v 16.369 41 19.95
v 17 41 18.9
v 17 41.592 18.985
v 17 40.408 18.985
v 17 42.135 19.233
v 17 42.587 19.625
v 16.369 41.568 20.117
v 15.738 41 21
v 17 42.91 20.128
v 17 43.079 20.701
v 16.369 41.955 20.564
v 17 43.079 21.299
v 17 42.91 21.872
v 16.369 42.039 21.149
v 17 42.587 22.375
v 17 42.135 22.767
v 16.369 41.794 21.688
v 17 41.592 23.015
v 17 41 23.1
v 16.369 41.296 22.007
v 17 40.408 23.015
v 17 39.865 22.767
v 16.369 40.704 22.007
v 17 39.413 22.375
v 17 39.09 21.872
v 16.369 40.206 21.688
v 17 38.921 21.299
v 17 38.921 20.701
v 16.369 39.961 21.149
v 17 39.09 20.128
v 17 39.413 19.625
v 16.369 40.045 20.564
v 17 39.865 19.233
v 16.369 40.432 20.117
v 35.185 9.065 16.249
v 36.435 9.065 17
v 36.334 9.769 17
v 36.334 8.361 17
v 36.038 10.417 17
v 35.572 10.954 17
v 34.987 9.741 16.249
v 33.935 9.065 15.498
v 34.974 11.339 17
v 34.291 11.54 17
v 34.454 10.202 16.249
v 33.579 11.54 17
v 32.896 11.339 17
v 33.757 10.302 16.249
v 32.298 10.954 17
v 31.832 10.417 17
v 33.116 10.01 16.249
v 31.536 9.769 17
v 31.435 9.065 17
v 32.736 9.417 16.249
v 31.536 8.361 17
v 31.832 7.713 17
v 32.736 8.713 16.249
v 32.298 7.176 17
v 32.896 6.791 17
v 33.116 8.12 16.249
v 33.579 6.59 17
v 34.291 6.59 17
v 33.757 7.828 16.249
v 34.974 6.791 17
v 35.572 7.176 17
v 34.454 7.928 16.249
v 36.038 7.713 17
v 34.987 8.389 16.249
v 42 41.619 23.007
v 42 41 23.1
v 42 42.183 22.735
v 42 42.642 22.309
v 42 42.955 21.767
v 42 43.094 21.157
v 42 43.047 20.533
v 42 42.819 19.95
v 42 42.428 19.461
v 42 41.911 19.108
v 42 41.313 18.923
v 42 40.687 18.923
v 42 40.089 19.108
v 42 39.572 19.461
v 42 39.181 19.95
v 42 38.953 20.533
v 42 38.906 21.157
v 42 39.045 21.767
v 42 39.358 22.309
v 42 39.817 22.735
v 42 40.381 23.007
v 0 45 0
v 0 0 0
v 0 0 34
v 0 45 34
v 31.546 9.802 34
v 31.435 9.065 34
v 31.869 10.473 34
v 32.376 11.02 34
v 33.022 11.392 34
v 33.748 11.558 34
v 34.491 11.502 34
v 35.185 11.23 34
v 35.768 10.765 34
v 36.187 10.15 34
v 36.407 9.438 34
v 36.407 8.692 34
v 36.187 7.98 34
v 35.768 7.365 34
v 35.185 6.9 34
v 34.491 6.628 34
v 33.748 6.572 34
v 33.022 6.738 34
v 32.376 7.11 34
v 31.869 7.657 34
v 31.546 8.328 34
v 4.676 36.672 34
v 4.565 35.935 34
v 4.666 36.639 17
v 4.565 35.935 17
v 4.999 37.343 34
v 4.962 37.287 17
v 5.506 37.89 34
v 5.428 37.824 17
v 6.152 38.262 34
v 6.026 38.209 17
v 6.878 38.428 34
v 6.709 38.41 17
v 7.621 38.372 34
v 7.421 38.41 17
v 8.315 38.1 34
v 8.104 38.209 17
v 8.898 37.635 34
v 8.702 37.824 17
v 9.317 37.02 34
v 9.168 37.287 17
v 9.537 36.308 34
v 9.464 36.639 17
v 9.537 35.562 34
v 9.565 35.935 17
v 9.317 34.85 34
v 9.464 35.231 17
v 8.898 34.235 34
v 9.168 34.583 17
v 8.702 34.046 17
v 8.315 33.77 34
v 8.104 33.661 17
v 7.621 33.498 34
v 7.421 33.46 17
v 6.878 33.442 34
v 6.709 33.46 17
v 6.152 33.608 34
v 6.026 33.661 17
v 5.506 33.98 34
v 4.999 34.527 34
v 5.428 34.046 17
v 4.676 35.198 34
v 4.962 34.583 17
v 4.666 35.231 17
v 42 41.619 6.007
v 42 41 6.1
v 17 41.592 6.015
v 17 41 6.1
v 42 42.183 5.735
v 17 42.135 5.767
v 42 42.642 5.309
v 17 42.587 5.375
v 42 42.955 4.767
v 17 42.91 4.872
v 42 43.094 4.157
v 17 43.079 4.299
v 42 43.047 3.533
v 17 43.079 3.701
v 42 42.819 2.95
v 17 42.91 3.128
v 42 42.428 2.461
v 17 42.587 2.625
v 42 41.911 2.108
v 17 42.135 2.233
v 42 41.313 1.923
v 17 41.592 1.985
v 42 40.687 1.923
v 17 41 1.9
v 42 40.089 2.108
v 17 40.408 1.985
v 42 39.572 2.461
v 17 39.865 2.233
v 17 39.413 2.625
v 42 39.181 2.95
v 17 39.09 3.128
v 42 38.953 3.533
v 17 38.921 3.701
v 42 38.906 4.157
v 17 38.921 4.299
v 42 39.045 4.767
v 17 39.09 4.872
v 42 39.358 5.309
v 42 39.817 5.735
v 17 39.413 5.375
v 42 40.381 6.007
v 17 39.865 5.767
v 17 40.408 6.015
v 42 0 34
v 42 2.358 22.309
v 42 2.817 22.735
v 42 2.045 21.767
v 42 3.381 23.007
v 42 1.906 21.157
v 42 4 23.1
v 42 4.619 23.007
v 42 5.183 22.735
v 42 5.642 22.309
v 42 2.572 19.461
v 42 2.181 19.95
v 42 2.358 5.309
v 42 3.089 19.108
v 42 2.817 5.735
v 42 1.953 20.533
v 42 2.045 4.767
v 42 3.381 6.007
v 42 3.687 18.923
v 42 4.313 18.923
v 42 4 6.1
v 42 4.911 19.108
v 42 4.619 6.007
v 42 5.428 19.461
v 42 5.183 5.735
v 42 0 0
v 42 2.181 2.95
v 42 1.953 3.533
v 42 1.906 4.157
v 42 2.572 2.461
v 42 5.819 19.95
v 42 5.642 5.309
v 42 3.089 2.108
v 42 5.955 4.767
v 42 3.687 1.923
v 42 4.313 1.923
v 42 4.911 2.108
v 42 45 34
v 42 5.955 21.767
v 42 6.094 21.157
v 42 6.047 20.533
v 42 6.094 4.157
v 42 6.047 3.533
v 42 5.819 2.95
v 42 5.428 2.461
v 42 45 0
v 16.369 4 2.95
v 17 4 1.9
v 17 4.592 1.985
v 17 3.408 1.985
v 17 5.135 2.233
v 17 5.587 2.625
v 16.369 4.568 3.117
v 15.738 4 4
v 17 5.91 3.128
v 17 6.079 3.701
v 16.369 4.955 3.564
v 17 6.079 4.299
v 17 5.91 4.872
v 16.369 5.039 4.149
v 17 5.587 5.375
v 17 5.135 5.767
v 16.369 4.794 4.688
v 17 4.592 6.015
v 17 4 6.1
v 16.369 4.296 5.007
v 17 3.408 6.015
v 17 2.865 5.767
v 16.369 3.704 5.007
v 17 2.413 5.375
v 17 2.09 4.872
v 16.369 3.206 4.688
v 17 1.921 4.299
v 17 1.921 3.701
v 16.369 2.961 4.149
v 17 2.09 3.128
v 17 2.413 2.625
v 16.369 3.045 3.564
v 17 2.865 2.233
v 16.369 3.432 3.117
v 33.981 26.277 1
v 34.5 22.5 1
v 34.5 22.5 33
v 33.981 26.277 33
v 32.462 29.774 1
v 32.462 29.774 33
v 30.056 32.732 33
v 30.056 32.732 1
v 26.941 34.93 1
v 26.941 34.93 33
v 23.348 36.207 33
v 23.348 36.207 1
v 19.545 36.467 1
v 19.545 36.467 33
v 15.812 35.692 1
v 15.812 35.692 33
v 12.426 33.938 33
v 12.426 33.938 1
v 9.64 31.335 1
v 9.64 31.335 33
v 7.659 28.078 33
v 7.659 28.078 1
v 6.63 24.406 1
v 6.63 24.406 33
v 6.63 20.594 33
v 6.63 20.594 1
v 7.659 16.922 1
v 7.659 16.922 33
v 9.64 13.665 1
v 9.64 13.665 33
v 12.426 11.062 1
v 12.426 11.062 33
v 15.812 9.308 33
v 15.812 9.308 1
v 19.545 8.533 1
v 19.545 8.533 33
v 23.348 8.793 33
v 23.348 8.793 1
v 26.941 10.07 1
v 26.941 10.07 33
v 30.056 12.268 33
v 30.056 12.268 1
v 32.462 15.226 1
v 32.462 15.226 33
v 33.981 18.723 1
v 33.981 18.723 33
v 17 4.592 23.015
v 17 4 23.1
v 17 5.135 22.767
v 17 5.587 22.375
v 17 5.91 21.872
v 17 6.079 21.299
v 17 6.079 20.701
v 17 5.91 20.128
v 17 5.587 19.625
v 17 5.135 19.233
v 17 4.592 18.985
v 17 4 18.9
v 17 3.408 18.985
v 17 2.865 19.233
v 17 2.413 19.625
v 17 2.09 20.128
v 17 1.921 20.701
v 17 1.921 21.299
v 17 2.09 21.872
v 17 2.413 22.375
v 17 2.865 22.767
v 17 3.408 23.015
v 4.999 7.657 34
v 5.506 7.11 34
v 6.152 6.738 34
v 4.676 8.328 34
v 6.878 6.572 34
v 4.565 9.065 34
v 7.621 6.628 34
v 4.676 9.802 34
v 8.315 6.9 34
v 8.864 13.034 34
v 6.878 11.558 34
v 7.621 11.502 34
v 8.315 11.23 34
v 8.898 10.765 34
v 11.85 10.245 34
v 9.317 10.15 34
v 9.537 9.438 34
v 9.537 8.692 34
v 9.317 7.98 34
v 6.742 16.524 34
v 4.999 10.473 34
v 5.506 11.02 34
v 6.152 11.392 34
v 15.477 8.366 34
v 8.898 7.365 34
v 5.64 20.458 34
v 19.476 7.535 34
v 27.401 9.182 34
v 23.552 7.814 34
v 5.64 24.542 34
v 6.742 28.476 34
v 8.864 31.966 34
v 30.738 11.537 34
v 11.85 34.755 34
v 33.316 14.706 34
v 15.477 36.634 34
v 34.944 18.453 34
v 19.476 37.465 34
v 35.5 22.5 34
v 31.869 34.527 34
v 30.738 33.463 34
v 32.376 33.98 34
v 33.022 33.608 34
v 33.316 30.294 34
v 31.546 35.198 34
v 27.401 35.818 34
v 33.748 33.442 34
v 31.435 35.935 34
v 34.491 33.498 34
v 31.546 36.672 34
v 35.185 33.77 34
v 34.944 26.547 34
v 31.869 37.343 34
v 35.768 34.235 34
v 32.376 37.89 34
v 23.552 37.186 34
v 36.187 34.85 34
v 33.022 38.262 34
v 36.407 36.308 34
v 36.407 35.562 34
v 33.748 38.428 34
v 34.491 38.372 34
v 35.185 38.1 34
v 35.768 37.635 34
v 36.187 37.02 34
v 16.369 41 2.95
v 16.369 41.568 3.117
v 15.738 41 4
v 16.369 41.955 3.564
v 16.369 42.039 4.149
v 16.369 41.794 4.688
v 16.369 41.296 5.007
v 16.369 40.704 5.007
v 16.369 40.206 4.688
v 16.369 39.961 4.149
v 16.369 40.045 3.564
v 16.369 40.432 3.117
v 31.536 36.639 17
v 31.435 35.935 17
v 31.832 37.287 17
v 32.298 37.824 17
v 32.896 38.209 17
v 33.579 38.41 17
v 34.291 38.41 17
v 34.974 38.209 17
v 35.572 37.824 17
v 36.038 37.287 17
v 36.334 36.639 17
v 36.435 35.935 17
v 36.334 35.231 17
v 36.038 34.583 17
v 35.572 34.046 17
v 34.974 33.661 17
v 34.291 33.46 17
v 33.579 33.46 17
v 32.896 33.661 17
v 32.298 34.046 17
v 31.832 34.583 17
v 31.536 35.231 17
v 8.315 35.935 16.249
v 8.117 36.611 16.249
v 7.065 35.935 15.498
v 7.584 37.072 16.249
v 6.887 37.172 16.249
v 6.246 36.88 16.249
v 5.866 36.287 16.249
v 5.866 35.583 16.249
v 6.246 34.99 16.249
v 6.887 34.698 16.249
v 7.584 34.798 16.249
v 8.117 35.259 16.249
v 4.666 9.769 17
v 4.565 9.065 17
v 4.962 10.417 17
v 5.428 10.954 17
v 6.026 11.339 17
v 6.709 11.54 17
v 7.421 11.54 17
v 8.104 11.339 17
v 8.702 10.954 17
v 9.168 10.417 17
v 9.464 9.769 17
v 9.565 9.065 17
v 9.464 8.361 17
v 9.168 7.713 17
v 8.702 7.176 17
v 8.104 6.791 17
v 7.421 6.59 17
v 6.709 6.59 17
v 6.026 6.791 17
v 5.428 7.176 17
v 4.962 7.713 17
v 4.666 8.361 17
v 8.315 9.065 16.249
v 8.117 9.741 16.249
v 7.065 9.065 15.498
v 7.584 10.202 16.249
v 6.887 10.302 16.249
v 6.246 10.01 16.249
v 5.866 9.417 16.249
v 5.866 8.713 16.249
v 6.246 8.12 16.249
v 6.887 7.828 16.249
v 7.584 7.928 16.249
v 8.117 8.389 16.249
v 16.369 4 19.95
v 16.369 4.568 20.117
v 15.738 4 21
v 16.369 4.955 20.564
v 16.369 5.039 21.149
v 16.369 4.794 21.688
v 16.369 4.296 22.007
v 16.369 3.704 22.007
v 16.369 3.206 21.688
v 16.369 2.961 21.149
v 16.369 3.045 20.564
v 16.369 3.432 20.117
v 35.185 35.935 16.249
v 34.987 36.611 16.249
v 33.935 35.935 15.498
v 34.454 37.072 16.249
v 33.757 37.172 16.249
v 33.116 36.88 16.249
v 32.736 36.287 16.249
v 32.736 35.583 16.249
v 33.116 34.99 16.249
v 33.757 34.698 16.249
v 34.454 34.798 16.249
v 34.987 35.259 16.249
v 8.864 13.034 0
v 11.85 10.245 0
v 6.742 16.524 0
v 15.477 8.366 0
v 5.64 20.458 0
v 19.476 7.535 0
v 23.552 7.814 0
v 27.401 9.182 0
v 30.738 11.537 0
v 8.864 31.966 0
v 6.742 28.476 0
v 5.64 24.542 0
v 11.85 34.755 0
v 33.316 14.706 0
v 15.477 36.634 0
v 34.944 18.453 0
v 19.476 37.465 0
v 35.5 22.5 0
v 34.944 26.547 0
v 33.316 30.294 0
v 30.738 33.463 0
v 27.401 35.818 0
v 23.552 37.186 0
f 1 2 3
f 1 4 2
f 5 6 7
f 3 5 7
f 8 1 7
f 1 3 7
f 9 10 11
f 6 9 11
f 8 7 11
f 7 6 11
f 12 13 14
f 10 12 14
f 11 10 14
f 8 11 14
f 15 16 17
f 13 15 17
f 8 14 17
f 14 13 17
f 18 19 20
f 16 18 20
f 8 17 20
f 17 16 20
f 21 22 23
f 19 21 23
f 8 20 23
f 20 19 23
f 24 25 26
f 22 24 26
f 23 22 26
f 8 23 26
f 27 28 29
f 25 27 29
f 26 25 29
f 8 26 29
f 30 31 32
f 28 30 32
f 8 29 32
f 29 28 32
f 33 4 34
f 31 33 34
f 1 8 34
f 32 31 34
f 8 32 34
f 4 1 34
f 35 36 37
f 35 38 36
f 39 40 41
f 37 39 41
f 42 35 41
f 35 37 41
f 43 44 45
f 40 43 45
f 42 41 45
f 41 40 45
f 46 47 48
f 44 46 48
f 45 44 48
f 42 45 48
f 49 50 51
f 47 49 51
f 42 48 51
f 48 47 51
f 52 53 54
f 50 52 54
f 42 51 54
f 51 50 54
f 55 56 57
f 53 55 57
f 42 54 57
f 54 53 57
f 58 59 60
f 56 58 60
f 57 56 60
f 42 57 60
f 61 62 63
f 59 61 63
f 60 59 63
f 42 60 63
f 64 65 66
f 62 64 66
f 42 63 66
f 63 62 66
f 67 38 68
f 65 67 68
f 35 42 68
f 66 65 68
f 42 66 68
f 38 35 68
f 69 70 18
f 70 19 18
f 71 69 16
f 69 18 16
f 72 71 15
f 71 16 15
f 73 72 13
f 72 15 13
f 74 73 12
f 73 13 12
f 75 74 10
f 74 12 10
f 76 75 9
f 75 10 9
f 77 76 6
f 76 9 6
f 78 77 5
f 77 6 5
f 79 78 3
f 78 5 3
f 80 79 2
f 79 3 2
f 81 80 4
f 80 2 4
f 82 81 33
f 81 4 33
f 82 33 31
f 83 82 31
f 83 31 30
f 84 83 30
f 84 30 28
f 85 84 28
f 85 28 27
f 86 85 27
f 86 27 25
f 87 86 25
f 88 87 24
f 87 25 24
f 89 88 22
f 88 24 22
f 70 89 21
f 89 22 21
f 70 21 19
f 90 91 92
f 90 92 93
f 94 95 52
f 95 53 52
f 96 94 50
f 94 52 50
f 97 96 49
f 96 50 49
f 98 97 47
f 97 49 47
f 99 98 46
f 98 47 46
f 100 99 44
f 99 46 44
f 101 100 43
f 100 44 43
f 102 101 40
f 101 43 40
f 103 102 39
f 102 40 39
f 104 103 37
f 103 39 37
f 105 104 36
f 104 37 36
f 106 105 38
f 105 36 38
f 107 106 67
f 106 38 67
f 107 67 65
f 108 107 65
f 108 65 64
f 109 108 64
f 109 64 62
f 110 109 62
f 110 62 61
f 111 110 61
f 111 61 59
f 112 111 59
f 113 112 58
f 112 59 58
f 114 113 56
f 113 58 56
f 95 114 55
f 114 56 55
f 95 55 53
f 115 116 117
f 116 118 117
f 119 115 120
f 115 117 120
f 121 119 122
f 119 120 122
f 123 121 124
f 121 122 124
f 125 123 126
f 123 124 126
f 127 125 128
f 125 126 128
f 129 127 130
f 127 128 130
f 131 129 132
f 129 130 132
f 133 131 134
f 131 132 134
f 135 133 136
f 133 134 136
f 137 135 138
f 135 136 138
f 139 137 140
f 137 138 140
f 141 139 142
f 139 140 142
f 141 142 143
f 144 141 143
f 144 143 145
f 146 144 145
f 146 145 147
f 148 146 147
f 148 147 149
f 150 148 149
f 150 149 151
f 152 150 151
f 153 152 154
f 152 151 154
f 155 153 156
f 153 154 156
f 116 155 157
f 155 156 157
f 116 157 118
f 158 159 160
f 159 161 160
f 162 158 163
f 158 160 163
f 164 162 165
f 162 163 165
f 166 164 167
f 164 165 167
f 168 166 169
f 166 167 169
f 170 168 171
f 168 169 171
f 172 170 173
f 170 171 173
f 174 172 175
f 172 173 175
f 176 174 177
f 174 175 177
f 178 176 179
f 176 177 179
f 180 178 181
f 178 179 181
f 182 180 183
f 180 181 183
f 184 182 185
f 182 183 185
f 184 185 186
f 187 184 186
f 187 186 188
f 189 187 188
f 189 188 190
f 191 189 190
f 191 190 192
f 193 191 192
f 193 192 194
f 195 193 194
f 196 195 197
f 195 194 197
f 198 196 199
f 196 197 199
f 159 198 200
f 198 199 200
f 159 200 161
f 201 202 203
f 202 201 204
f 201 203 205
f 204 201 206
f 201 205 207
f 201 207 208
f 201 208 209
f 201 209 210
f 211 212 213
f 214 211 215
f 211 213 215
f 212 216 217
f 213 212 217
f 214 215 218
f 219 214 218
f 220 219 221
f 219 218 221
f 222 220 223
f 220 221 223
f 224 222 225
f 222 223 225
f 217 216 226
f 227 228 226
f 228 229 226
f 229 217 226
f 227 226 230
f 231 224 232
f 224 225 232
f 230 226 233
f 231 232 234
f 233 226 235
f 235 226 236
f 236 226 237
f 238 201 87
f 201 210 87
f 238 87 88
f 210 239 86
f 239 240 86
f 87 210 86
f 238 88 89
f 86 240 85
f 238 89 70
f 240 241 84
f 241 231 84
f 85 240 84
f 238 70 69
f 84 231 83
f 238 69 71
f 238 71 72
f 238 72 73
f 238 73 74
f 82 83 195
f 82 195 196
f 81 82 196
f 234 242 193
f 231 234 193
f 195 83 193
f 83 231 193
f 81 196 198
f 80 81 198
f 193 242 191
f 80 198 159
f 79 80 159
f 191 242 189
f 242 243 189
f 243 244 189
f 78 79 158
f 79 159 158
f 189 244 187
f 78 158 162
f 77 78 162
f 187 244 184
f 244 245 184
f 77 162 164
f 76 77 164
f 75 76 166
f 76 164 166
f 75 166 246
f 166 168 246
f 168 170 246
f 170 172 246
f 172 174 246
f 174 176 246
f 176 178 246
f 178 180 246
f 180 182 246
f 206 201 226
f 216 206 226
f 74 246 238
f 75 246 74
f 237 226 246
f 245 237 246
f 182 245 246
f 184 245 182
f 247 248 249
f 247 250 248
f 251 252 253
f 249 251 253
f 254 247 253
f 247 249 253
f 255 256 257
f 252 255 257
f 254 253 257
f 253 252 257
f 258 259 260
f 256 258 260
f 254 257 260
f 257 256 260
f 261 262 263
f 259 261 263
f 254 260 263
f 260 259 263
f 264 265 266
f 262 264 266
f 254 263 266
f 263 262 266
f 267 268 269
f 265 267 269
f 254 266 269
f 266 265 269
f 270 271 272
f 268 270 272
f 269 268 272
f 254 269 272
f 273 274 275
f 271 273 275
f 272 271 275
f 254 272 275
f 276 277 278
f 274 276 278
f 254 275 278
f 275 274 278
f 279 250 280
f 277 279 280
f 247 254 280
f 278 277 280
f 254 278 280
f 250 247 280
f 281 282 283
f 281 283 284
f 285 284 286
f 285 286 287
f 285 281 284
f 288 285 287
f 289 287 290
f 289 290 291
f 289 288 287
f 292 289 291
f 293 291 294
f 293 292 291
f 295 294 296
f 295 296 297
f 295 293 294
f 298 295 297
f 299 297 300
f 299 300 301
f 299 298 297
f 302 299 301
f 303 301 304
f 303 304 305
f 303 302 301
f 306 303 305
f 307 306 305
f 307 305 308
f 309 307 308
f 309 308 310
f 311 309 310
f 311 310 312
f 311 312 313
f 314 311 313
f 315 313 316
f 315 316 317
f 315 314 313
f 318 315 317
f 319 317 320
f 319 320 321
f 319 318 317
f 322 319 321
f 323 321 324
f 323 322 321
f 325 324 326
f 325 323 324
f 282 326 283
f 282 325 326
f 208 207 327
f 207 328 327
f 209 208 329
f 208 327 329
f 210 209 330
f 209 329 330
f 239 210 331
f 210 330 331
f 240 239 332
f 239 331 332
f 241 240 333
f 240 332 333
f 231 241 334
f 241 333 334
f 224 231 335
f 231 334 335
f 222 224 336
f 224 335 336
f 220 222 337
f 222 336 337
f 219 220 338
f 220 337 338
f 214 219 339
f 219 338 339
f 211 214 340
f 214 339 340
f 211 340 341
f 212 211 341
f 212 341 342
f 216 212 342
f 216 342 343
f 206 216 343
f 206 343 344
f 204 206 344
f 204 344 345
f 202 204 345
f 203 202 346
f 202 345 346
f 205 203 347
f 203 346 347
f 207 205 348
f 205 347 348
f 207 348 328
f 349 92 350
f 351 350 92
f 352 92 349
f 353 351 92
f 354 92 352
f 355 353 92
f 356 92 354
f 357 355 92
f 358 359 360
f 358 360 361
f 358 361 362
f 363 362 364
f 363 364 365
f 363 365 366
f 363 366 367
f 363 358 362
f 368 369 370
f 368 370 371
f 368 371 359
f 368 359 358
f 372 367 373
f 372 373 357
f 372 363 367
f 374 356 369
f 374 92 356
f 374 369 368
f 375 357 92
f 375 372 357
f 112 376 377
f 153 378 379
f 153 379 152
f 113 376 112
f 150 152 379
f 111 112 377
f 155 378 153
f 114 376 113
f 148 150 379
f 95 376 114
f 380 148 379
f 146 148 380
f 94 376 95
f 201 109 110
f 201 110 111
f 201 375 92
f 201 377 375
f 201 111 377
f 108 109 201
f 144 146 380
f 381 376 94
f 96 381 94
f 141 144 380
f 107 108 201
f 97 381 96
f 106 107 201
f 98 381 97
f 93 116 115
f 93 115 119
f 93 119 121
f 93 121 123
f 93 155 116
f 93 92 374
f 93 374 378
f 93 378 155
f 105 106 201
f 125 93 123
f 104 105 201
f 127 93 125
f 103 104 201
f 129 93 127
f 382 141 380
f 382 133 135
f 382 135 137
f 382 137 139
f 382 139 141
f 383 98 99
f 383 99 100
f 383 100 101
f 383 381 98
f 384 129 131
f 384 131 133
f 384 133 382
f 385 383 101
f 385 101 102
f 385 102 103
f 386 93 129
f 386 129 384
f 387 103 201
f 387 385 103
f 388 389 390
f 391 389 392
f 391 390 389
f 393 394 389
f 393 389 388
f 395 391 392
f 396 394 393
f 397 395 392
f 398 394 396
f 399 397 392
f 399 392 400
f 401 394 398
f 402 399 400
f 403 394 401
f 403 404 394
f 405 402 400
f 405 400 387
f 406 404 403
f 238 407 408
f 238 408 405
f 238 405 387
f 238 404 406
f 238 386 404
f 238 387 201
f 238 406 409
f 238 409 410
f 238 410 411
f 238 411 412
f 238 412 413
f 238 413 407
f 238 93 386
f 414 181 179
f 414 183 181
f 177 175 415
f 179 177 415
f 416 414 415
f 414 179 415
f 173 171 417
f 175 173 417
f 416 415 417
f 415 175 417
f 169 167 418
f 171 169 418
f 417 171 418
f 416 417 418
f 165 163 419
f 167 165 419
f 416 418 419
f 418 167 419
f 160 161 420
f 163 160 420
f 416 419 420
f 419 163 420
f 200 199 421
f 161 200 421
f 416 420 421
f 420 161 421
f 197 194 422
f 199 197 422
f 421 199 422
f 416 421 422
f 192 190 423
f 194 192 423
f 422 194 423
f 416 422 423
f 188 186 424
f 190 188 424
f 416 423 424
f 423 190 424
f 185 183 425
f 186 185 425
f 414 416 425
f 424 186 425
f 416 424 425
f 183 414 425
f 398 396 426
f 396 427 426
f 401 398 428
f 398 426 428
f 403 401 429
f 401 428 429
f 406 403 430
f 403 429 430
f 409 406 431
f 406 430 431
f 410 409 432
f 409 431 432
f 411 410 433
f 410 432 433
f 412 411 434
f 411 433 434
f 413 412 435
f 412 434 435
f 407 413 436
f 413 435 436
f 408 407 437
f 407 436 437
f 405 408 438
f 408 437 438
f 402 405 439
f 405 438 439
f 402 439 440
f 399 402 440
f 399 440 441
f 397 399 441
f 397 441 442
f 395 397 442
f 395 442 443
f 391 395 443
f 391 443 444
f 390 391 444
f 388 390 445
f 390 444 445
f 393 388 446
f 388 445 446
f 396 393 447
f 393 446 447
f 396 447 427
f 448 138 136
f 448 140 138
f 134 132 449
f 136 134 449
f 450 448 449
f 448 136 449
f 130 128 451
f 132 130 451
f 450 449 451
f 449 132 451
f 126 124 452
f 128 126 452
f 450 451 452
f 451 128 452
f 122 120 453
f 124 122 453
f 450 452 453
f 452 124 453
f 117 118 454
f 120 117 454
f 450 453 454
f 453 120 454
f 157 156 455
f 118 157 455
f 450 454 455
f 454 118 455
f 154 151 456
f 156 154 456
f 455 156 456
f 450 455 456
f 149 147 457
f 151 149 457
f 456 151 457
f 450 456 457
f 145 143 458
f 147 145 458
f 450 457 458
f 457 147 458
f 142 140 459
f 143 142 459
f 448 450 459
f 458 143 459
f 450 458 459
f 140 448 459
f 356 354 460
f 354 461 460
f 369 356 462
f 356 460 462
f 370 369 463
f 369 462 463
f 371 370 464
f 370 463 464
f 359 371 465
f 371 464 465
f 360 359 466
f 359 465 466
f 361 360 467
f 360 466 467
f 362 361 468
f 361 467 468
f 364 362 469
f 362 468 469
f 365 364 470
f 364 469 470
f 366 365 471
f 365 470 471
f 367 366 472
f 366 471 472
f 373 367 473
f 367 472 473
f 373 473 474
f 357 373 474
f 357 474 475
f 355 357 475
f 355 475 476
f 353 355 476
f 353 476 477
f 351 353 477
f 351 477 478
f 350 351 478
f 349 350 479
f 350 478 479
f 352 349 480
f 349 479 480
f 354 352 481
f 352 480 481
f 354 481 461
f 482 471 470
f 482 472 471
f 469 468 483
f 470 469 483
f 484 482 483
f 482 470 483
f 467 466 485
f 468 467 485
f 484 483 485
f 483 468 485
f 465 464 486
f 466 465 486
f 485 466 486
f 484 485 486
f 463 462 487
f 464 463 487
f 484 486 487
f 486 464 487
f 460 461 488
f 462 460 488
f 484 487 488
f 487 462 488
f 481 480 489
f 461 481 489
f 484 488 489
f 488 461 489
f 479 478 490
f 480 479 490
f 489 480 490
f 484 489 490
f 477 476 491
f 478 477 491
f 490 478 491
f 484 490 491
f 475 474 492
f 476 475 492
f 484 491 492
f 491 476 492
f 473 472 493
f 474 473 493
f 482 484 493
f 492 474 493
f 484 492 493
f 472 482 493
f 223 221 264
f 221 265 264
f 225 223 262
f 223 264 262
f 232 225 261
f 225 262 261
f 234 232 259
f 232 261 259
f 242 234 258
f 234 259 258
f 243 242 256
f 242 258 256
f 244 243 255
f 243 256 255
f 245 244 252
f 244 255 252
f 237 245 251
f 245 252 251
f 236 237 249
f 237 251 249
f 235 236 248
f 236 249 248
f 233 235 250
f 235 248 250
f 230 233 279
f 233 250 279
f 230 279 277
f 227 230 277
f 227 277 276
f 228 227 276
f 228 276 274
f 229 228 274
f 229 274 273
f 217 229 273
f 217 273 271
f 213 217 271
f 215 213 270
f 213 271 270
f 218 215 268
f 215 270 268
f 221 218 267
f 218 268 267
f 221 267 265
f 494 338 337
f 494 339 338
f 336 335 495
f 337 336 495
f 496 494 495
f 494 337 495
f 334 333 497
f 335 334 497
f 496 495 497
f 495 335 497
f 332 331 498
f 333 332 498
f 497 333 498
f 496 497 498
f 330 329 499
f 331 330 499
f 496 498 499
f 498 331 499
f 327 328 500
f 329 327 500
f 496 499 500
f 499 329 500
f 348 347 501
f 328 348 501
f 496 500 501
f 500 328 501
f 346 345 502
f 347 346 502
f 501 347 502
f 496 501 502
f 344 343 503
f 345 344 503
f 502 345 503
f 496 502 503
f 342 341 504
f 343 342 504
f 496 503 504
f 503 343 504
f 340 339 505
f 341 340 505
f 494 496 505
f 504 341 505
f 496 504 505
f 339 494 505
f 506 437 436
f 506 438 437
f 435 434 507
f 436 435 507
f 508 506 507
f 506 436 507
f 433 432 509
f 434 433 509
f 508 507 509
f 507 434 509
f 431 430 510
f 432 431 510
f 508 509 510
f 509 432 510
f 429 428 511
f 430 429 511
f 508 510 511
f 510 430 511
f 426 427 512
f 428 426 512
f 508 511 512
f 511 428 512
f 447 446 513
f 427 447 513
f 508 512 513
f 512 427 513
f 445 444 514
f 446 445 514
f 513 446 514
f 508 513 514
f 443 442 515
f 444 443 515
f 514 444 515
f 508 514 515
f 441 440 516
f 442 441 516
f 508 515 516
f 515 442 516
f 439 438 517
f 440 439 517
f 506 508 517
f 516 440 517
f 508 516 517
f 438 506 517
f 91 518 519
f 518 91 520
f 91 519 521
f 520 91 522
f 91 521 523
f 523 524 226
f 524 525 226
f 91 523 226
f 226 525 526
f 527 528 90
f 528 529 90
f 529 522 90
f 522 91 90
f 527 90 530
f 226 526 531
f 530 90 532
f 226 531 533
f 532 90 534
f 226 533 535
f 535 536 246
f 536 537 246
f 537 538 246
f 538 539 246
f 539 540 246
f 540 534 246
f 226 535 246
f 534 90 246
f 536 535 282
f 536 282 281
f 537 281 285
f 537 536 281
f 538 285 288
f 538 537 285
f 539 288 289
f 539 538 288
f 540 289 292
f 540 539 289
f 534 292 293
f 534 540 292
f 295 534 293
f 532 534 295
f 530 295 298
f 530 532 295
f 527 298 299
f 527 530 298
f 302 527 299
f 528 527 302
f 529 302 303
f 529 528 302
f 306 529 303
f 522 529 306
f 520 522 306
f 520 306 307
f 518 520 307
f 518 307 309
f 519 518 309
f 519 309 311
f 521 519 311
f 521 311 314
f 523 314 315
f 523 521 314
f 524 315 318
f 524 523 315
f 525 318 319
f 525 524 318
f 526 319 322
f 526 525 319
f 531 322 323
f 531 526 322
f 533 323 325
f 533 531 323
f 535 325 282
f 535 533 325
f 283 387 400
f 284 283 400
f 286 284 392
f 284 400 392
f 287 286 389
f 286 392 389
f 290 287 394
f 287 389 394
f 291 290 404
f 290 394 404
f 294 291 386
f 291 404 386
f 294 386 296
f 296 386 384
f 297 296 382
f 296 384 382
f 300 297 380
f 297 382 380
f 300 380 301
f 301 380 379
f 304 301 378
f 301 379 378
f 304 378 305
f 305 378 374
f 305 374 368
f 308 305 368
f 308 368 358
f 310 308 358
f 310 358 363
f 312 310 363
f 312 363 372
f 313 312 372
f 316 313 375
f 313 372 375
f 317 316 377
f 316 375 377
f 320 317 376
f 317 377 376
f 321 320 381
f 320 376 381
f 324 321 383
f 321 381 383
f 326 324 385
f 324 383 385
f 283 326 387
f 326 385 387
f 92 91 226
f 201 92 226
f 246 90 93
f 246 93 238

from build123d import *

# Parameters (mm, degrees)
SZKIC1_W                       = 42
SZKIC1_H                       = 45
SZKIC1_R                       = 14
DODANIE_WYCI_GNI_CIE1_DEPTH    = 34
SFAZOWANIE1_SIZE               = 1
OTW_R_GWINTOWANY_M6X1_01_D     = 5
OTW_R_GWINTOWANY_M6X1_01_DEPTH = 17
OTW_R_GWINTOWANY_M6X1_01_TIP   = 1.502151548
OTW_R_GWINTOWANY_M5X0_82_D     = 4.2
OTW_R_GWINTOWANY_M5X0_82_DEPTH = 25
OTW_R_GWINTOWANY_M5X0_82_TIP   = 1.2618073


with BuildPart() as part:
    # Szkic1 → Dodanie-wyciągnięcie1 (new body)
    with BuildSketch(Plane.XY):
        with Locations((21, 22.5)):
            Rectangle(SZKIC1_W, SZKIC1_H)
        with Locations((20.5, 22.5)):
            Circle(SZKIC1_R, mode=Mode.SUBTRACT)
    extrude(amount=DODANIE_WYCI_GNI_CIE1_DEPTH)

    # Sfazowanie1
    sfazowanie1_edges = [part.edges().sort_by_distance(p)[0] for p in [
        (6.5, 22.5, 0),
        (6.5, 22.5, 34),
    ]]
    chamfer(sfazowanie1_edges, length=SFAZOWANIE1_SIZE)

    # Otwór gwintowany M6x1.01
    with Locations(Plane.XY.offset(34)):
        with Locations((33.935028843, 35.935028843), (7.064971157, 35.935028843), (7.064971157, 9.064971157), (33.935028843, 9.064971157)):
            Hole(OTW_R_GWINTOWANY_M6X1_01_D / 2, depth=OTW_R_GWINTOWANY_M6X1_01_DEPTH)
            with Locations((0, 0, -(OTW_R_GWINTOWANY_M6X1_01_DEPTH + OTW_R_GWINTOWANY_M6X1_01_TIP / 2))):  # 118° drill point
                Cone(0, OTW_R_GWINTOWANY_M6X1_01_D / 2, OTW_R_GWINTOWANY_M6X1_01_TIP, mode=Mode.SUBTRACT)

    # Otwór gwintowany M5x0.82
    with Locations(Plane(origin=(42, 0, 0), x_dir=(0, 0, -1), z_dir=(1, 0, 0))):
        with Locations((-21, 41), (-4, 41), (-4, 4), (-21, 4)):
            Hole(OTW_R_GWINTOWANY_M5X0_82_D / 2, depth=OTW_R_GWINTOWANY_M5X0_82_DEPTH)
            with Locations((0, 0, -(OTW_R_GWINTOWANY_M5X0_82_DEPTH + OTW_R_GWINTOWANY_M5X0_82_TIP / 2))):  # 118° drill point
                Cone(0, OTW_R_GWINTOWANY_M5X0_82_D / 2, OTW_R_GWINTOWANY_M5X0_82_TIP, mode=Mode.SUBTRACT)


solid = part.part
